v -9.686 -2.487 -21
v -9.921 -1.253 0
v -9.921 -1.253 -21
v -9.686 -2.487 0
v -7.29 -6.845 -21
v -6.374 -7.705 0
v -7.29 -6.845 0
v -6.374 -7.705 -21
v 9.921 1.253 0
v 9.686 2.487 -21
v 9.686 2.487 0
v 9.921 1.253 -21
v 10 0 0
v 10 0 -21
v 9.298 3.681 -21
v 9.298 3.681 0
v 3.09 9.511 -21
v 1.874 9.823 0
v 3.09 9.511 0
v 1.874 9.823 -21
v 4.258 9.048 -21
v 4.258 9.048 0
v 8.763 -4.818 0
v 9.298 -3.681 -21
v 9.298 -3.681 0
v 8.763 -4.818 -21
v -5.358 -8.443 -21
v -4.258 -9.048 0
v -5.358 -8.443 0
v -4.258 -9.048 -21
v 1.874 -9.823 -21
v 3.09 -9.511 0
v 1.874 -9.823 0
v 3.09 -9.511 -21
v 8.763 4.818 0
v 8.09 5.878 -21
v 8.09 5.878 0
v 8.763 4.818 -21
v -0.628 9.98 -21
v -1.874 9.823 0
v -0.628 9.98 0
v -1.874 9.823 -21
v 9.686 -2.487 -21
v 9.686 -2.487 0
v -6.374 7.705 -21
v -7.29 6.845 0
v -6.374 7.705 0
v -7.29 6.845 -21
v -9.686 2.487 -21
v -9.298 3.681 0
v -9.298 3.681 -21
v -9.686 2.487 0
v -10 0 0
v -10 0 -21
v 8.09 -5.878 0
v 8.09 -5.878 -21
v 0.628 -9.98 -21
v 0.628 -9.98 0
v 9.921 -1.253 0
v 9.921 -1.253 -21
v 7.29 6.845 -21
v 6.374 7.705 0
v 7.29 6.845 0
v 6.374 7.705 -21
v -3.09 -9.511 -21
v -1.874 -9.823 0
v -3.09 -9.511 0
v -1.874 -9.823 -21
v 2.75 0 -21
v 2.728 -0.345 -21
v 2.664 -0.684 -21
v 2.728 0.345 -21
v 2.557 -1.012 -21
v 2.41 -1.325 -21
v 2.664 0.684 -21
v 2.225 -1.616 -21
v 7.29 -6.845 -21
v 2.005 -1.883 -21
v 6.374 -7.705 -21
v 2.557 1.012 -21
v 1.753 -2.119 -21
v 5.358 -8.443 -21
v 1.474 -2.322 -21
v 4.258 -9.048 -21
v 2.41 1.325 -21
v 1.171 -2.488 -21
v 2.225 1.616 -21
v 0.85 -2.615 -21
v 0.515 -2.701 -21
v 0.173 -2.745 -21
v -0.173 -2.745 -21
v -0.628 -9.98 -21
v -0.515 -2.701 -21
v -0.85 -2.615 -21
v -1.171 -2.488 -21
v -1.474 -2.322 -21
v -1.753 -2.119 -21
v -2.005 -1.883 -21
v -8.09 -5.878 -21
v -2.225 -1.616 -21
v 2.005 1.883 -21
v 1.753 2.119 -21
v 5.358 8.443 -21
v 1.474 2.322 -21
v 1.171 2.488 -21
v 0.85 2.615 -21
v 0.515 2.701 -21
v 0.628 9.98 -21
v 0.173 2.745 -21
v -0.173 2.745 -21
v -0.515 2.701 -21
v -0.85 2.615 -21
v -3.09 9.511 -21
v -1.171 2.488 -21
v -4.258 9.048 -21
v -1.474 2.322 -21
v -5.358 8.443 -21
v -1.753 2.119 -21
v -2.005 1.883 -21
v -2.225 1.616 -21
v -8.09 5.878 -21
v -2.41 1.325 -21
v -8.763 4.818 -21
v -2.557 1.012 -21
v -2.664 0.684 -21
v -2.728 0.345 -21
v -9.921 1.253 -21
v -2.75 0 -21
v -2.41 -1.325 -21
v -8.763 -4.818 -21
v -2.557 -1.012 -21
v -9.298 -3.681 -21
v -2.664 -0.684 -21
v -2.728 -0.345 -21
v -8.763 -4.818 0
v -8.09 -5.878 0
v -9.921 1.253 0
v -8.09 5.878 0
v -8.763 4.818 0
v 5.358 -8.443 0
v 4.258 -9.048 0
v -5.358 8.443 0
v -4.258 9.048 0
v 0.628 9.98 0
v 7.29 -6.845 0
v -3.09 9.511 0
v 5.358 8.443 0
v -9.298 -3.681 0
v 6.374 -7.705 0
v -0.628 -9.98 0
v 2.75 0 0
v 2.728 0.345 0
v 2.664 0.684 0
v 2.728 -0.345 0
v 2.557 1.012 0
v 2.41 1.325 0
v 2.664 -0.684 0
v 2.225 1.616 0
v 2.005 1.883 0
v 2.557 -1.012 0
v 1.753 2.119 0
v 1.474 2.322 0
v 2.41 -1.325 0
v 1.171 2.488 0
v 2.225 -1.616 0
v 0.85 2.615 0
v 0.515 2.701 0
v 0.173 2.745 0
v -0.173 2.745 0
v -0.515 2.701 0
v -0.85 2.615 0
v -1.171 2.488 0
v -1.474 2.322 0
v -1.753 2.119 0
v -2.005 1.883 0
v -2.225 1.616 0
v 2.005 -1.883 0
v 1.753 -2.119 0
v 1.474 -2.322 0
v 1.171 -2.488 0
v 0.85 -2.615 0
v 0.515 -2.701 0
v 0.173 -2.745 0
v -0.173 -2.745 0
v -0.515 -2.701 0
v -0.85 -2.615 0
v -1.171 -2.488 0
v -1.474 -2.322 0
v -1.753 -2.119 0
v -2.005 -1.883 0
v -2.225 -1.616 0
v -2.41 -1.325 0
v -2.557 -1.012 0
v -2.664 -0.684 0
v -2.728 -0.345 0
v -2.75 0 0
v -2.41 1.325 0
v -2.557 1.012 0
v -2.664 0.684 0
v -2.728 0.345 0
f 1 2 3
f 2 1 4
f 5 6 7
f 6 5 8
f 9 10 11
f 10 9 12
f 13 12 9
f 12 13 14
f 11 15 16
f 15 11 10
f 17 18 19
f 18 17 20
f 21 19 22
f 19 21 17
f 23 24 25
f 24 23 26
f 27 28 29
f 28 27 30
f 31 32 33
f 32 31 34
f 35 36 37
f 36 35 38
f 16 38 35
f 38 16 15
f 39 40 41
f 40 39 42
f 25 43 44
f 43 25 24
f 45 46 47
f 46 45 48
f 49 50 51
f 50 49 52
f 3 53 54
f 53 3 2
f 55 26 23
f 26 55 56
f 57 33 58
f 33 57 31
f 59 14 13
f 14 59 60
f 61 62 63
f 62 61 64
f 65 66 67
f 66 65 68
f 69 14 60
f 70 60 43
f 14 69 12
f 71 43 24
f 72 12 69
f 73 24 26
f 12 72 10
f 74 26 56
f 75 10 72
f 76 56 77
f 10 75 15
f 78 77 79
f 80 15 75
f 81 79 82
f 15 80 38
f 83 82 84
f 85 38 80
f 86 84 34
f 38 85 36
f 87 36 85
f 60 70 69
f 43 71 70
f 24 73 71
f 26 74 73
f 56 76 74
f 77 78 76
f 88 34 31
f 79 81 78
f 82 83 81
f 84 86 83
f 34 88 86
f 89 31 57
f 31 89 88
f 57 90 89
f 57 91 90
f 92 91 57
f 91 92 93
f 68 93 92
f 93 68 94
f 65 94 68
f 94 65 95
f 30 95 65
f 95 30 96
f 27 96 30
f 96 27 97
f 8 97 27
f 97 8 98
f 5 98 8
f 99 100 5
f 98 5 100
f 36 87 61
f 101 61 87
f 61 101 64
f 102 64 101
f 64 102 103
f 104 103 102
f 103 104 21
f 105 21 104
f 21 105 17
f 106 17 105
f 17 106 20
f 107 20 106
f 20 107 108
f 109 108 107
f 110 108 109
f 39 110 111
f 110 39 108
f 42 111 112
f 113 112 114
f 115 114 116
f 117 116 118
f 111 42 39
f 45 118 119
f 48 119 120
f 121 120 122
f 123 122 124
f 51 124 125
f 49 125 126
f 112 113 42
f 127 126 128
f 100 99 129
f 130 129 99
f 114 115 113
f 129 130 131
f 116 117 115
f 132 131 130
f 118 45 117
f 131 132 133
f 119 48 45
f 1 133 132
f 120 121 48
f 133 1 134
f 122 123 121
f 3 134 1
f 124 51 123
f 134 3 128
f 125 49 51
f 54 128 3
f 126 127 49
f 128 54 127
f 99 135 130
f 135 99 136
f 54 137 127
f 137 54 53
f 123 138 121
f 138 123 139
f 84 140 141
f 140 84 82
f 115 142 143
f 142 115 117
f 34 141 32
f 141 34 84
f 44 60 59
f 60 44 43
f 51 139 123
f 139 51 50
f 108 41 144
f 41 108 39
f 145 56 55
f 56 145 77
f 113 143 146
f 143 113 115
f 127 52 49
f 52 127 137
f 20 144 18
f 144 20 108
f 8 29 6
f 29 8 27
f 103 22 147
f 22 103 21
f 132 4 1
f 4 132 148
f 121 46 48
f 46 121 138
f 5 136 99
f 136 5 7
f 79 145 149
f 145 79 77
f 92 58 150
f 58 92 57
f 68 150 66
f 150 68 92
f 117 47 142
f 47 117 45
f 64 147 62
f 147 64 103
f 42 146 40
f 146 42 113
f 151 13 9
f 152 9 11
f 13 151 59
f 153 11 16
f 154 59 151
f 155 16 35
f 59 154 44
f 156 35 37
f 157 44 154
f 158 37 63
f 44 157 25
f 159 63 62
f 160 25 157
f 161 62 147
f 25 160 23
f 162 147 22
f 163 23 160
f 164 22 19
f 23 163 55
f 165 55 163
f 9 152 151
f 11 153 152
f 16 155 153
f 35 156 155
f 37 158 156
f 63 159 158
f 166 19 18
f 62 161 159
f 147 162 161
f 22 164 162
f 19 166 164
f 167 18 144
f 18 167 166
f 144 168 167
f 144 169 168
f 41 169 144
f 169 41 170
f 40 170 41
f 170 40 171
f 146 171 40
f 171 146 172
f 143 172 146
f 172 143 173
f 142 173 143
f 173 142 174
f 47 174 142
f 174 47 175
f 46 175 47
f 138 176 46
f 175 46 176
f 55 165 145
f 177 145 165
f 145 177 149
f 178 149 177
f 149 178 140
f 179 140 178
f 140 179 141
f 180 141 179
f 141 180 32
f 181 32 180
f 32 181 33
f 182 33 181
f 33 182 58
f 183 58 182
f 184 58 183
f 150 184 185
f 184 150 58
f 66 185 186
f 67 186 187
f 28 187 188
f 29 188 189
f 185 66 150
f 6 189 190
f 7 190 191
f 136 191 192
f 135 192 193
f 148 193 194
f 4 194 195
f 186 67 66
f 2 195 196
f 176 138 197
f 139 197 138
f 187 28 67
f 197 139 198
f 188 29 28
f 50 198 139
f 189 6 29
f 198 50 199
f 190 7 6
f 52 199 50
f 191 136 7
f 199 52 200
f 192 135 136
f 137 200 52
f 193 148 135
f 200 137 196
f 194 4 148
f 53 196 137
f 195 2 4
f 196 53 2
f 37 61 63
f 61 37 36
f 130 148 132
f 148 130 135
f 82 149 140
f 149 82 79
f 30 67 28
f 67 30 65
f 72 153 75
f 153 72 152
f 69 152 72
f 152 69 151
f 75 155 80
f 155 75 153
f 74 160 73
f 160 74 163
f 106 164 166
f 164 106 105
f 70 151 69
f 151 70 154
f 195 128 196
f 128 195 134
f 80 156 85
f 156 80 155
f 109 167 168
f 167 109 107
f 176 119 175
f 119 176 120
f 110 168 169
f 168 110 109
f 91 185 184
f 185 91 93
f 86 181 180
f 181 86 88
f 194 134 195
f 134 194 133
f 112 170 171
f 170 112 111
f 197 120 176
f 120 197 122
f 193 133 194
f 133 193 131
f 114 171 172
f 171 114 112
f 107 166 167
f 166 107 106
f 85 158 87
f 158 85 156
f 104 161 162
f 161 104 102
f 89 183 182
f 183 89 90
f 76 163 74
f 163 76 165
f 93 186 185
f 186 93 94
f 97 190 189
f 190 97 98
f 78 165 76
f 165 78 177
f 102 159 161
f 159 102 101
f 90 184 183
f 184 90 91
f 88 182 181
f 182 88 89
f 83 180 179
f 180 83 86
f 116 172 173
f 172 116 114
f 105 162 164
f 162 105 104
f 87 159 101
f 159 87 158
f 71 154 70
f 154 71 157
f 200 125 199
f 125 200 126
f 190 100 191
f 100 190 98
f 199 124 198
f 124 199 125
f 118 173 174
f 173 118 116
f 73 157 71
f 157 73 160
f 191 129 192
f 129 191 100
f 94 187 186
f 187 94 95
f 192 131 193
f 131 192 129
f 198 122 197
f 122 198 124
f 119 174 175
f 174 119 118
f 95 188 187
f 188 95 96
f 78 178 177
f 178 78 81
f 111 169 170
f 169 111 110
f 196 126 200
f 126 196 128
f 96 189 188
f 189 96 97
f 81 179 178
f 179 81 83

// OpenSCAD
$fn = 50;


difference() {
	union() {
		translate(v = [0, 0, -21.0000000000]) {
			cylinder(h = 21, r = 10.0000000000);
		}
		cylinder(h = 0, r = 13.0000000000);
	}
	union() {
		#translate(v = [0, 0, -21]) {
			cylinder(h = 21, r = 2.7500000000);
		}
	}
}
